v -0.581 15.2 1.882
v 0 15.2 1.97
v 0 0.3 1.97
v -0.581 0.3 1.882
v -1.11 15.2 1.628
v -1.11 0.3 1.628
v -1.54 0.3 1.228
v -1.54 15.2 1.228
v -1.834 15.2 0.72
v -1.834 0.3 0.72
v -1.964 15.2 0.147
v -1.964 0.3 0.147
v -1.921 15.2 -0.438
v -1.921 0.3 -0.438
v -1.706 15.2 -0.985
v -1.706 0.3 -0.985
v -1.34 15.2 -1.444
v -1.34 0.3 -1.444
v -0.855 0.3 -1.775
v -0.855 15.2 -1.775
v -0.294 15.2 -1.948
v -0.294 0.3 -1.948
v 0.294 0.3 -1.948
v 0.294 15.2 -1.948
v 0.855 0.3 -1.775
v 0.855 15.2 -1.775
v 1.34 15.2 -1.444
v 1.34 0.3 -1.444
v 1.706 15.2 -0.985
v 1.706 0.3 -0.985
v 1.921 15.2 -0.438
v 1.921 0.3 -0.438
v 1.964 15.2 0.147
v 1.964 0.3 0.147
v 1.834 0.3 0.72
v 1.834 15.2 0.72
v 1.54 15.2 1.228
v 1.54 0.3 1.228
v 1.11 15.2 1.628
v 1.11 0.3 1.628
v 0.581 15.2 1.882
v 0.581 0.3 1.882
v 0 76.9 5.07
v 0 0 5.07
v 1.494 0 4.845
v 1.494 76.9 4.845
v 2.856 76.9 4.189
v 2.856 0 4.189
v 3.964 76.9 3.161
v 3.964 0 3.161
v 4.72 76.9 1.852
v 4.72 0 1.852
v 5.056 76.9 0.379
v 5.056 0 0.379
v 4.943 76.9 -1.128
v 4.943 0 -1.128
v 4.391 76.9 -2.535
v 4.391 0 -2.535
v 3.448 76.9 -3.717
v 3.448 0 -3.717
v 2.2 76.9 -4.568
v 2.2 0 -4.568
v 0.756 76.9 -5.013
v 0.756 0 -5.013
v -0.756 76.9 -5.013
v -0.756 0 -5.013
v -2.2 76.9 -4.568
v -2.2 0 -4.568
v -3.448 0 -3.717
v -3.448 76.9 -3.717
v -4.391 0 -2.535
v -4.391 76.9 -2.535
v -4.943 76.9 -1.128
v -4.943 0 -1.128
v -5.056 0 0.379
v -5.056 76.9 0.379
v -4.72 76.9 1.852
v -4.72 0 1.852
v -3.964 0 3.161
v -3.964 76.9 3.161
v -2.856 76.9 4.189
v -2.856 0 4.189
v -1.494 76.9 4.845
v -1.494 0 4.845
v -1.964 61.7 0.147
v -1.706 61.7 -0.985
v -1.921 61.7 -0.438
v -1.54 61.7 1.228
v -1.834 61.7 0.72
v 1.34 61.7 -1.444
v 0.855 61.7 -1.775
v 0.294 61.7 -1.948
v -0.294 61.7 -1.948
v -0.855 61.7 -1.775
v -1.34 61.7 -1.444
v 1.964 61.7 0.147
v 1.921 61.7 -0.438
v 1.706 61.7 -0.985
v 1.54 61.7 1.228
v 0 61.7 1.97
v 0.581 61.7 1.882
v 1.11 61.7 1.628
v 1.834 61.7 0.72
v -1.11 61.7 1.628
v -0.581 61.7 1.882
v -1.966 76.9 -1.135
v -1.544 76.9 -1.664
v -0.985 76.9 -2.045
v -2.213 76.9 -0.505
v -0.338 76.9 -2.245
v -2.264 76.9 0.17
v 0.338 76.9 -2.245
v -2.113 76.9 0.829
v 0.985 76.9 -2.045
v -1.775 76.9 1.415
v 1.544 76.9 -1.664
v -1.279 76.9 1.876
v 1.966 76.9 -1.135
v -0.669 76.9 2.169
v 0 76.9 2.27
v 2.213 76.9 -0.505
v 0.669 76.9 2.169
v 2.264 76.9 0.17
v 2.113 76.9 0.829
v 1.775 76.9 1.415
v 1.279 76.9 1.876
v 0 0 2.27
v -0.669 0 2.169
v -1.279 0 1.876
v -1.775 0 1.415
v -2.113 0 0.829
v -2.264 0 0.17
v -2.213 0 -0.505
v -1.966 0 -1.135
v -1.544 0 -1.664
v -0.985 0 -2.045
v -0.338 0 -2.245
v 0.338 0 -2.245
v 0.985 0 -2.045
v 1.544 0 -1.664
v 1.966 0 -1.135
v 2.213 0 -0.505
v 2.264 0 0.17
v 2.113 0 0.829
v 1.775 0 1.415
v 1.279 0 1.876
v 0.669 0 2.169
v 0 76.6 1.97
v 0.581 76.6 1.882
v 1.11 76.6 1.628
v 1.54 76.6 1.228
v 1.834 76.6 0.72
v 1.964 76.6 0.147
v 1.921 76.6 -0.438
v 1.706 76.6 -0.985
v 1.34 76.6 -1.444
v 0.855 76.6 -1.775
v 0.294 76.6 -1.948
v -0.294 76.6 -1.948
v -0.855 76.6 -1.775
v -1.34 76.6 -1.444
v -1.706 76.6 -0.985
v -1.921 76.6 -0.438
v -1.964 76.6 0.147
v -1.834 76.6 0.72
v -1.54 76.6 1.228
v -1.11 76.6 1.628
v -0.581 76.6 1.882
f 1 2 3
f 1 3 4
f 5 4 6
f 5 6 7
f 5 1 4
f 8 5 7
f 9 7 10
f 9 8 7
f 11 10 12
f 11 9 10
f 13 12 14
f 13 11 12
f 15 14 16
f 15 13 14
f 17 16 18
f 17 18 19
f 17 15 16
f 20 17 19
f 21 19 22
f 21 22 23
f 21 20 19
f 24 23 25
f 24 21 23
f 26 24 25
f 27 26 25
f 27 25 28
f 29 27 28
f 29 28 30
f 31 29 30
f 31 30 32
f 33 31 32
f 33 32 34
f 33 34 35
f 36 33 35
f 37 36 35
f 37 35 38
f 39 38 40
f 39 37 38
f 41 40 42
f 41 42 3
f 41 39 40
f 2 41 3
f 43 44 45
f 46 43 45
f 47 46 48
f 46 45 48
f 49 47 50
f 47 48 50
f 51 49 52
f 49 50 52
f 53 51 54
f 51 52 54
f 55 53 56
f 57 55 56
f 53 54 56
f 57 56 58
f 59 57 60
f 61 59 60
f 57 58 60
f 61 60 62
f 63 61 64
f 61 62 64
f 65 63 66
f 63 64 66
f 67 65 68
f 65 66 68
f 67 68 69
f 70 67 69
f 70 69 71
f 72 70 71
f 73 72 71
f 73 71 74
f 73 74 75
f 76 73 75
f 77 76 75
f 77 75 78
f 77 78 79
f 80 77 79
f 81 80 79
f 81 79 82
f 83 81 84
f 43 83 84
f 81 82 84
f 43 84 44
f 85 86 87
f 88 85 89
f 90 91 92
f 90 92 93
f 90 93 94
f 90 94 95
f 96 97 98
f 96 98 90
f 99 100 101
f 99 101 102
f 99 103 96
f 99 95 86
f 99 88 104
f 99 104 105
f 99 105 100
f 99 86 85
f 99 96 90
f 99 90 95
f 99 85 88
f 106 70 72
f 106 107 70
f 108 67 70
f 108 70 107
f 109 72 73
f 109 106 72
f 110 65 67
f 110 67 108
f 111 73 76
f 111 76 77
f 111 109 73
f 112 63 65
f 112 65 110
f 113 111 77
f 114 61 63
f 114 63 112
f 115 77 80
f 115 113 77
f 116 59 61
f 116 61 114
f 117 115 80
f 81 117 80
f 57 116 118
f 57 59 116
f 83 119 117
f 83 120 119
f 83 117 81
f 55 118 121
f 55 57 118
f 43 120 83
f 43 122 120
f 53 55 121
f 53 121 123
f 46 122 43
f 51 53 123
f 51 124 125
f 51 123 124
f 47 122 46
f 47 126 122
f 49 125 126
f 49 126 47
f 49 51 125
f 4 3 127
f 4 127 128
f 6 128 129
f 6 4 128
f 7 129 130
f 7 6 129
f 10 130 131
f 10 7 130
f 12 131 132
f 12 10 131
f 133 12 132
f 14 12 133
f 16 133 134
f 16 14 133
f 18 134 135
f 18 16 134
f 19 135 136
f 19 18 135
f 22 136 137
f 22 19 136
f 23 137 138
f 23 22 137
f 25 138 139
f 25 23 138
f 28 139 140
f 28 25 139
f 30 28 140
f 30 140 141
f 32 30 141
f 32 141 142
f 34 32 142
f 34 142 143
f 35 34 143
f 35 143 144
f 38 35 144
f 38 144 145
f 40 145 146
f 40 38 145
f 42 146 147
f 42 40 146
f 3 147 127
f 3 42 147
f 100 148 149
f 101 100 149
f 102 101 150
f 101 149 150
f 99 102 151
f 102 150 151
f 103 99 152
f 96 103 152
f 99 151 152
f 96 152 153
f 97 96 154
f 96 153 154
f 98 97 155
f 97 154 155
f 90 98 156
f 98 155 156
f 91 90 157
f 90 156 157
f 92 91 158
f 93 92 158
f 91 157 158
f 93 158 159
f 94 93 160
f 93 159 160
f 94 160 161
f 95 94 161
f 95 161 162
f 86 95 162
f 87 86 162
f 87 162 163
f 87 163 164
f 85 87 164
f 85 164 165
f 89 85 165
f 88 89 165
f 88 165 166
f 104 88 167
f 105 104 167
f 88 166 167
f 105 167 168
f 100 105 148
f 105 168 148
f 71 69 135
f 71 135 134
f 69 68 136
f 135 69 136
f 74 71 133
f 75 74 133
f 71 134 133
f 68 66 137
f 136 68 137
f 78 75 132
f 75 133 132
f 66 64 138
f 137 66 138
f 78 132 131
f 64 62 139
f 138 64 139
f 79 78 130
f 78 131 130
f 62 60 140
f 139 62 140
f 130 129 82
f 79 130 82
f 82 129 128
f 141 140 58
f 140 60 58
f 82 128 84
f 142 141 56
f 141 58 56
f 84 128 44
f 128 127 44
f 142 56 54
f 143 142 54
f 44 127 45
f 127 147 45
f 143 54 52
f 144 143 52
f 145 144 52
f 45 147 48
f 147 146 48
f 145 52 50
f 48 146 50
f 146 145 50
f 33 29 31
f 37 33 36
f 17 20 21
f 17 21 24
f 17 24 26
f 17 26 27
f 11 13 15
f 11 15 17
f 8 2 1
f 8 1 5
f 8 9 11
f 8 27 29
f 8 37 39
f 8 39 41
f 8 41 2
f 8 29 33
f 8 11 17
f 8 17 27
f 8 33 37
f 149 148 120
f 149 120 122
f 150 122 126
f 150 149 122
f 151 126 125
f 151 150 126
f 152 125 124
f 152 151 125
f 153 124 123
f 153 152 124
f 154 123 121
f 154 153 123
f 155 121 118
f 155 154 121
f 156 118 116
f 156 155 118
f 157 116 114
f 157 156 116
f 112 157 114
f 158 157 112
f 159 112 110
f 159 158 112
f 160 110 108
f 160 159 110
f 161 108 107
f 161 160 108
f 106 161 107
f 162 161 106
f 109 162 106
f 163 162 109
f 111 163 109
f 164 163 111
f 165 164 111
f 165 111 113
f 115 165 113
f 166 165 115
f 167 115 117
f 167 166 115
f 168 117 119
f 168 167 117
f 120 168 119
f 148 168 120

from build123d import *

# Parameters (mm, degrees)
SKETCH1_R           = 5.07
BOSS_EXTRUDE1_DEPTH = 76.9
SKETCH2_R           = 1.97
CUT_EXTRUDE1_DEPTH  = 15.2
CHAMFER2_SIZE       = 0.3
CUT_EXTRUDE2_START  = -15.2
SKETCH3_R           = 1.97
CUT_EXTRUDE2_DEPTH  = 15.2
CHAMFER3_SIZE       = 0.3


with BuildPart() as part:
    # Sketch1 → Boss-Extrude1 (new body)
    with BuildSketch(Plane(origin=(0, 0, 0), x_dir=(1, 0, 0), z_dir=(0, 1, 0))):
        with Locations(Location((0, 0, 0), (0, 0, 270))):
            Circle(SKETCH1_R)
    extrude(amount=BOSS_EXTRUDE1_DEPTH)

    # Sketch2 → Cut-Extrude1 (cut)
    with BuildSketch(Plane(origin=(0, 76.9, 0), x_dir=(1, 0, 0), z_dir=(0, 1, 0))):
        with Locations(Location((0, 0, 0), (0, 0, 270))):
            Circle(SKETCH2_R)
    extrude(amount=-CUT_EXTRUDE1_DEPTH, mode=Mode.SUBTRACT)

    # Chamfer2
    chamfer2_edges = [part.edges().sort_by_distance(p)[0] for p in [
        (0, 76.9, -1.97),
    ]]
    chamfer(chamfer2_edges, length=CHAMFER2_SIZE)

    # Sketch3 → Cut-Extrude2 (cut)
    with BuildSketch(Plane(origin=(0, 0, 0), x_dir=(-1, 0, 0), z_dir=(0, -1, 0)).offset(CUT_EXTRUDE2_START)):
        with Locations(Location((0, 0, 0), (0, 0, 270))):
            Circle(SKETCH3_R)
    extrude(amount=CUT_EXTRUDE2_DEPTH, mode=Mode.SUBTRACT)

    # Chamfer3
    chamfer3_edges = [part.edges().sort_by_distance(p)[0] for p in [
        (0, 0, -1.97),
    ]]
    chamfer(chamfer3_edges, length=CHAMFER3_SIZE)


solid = part.part
